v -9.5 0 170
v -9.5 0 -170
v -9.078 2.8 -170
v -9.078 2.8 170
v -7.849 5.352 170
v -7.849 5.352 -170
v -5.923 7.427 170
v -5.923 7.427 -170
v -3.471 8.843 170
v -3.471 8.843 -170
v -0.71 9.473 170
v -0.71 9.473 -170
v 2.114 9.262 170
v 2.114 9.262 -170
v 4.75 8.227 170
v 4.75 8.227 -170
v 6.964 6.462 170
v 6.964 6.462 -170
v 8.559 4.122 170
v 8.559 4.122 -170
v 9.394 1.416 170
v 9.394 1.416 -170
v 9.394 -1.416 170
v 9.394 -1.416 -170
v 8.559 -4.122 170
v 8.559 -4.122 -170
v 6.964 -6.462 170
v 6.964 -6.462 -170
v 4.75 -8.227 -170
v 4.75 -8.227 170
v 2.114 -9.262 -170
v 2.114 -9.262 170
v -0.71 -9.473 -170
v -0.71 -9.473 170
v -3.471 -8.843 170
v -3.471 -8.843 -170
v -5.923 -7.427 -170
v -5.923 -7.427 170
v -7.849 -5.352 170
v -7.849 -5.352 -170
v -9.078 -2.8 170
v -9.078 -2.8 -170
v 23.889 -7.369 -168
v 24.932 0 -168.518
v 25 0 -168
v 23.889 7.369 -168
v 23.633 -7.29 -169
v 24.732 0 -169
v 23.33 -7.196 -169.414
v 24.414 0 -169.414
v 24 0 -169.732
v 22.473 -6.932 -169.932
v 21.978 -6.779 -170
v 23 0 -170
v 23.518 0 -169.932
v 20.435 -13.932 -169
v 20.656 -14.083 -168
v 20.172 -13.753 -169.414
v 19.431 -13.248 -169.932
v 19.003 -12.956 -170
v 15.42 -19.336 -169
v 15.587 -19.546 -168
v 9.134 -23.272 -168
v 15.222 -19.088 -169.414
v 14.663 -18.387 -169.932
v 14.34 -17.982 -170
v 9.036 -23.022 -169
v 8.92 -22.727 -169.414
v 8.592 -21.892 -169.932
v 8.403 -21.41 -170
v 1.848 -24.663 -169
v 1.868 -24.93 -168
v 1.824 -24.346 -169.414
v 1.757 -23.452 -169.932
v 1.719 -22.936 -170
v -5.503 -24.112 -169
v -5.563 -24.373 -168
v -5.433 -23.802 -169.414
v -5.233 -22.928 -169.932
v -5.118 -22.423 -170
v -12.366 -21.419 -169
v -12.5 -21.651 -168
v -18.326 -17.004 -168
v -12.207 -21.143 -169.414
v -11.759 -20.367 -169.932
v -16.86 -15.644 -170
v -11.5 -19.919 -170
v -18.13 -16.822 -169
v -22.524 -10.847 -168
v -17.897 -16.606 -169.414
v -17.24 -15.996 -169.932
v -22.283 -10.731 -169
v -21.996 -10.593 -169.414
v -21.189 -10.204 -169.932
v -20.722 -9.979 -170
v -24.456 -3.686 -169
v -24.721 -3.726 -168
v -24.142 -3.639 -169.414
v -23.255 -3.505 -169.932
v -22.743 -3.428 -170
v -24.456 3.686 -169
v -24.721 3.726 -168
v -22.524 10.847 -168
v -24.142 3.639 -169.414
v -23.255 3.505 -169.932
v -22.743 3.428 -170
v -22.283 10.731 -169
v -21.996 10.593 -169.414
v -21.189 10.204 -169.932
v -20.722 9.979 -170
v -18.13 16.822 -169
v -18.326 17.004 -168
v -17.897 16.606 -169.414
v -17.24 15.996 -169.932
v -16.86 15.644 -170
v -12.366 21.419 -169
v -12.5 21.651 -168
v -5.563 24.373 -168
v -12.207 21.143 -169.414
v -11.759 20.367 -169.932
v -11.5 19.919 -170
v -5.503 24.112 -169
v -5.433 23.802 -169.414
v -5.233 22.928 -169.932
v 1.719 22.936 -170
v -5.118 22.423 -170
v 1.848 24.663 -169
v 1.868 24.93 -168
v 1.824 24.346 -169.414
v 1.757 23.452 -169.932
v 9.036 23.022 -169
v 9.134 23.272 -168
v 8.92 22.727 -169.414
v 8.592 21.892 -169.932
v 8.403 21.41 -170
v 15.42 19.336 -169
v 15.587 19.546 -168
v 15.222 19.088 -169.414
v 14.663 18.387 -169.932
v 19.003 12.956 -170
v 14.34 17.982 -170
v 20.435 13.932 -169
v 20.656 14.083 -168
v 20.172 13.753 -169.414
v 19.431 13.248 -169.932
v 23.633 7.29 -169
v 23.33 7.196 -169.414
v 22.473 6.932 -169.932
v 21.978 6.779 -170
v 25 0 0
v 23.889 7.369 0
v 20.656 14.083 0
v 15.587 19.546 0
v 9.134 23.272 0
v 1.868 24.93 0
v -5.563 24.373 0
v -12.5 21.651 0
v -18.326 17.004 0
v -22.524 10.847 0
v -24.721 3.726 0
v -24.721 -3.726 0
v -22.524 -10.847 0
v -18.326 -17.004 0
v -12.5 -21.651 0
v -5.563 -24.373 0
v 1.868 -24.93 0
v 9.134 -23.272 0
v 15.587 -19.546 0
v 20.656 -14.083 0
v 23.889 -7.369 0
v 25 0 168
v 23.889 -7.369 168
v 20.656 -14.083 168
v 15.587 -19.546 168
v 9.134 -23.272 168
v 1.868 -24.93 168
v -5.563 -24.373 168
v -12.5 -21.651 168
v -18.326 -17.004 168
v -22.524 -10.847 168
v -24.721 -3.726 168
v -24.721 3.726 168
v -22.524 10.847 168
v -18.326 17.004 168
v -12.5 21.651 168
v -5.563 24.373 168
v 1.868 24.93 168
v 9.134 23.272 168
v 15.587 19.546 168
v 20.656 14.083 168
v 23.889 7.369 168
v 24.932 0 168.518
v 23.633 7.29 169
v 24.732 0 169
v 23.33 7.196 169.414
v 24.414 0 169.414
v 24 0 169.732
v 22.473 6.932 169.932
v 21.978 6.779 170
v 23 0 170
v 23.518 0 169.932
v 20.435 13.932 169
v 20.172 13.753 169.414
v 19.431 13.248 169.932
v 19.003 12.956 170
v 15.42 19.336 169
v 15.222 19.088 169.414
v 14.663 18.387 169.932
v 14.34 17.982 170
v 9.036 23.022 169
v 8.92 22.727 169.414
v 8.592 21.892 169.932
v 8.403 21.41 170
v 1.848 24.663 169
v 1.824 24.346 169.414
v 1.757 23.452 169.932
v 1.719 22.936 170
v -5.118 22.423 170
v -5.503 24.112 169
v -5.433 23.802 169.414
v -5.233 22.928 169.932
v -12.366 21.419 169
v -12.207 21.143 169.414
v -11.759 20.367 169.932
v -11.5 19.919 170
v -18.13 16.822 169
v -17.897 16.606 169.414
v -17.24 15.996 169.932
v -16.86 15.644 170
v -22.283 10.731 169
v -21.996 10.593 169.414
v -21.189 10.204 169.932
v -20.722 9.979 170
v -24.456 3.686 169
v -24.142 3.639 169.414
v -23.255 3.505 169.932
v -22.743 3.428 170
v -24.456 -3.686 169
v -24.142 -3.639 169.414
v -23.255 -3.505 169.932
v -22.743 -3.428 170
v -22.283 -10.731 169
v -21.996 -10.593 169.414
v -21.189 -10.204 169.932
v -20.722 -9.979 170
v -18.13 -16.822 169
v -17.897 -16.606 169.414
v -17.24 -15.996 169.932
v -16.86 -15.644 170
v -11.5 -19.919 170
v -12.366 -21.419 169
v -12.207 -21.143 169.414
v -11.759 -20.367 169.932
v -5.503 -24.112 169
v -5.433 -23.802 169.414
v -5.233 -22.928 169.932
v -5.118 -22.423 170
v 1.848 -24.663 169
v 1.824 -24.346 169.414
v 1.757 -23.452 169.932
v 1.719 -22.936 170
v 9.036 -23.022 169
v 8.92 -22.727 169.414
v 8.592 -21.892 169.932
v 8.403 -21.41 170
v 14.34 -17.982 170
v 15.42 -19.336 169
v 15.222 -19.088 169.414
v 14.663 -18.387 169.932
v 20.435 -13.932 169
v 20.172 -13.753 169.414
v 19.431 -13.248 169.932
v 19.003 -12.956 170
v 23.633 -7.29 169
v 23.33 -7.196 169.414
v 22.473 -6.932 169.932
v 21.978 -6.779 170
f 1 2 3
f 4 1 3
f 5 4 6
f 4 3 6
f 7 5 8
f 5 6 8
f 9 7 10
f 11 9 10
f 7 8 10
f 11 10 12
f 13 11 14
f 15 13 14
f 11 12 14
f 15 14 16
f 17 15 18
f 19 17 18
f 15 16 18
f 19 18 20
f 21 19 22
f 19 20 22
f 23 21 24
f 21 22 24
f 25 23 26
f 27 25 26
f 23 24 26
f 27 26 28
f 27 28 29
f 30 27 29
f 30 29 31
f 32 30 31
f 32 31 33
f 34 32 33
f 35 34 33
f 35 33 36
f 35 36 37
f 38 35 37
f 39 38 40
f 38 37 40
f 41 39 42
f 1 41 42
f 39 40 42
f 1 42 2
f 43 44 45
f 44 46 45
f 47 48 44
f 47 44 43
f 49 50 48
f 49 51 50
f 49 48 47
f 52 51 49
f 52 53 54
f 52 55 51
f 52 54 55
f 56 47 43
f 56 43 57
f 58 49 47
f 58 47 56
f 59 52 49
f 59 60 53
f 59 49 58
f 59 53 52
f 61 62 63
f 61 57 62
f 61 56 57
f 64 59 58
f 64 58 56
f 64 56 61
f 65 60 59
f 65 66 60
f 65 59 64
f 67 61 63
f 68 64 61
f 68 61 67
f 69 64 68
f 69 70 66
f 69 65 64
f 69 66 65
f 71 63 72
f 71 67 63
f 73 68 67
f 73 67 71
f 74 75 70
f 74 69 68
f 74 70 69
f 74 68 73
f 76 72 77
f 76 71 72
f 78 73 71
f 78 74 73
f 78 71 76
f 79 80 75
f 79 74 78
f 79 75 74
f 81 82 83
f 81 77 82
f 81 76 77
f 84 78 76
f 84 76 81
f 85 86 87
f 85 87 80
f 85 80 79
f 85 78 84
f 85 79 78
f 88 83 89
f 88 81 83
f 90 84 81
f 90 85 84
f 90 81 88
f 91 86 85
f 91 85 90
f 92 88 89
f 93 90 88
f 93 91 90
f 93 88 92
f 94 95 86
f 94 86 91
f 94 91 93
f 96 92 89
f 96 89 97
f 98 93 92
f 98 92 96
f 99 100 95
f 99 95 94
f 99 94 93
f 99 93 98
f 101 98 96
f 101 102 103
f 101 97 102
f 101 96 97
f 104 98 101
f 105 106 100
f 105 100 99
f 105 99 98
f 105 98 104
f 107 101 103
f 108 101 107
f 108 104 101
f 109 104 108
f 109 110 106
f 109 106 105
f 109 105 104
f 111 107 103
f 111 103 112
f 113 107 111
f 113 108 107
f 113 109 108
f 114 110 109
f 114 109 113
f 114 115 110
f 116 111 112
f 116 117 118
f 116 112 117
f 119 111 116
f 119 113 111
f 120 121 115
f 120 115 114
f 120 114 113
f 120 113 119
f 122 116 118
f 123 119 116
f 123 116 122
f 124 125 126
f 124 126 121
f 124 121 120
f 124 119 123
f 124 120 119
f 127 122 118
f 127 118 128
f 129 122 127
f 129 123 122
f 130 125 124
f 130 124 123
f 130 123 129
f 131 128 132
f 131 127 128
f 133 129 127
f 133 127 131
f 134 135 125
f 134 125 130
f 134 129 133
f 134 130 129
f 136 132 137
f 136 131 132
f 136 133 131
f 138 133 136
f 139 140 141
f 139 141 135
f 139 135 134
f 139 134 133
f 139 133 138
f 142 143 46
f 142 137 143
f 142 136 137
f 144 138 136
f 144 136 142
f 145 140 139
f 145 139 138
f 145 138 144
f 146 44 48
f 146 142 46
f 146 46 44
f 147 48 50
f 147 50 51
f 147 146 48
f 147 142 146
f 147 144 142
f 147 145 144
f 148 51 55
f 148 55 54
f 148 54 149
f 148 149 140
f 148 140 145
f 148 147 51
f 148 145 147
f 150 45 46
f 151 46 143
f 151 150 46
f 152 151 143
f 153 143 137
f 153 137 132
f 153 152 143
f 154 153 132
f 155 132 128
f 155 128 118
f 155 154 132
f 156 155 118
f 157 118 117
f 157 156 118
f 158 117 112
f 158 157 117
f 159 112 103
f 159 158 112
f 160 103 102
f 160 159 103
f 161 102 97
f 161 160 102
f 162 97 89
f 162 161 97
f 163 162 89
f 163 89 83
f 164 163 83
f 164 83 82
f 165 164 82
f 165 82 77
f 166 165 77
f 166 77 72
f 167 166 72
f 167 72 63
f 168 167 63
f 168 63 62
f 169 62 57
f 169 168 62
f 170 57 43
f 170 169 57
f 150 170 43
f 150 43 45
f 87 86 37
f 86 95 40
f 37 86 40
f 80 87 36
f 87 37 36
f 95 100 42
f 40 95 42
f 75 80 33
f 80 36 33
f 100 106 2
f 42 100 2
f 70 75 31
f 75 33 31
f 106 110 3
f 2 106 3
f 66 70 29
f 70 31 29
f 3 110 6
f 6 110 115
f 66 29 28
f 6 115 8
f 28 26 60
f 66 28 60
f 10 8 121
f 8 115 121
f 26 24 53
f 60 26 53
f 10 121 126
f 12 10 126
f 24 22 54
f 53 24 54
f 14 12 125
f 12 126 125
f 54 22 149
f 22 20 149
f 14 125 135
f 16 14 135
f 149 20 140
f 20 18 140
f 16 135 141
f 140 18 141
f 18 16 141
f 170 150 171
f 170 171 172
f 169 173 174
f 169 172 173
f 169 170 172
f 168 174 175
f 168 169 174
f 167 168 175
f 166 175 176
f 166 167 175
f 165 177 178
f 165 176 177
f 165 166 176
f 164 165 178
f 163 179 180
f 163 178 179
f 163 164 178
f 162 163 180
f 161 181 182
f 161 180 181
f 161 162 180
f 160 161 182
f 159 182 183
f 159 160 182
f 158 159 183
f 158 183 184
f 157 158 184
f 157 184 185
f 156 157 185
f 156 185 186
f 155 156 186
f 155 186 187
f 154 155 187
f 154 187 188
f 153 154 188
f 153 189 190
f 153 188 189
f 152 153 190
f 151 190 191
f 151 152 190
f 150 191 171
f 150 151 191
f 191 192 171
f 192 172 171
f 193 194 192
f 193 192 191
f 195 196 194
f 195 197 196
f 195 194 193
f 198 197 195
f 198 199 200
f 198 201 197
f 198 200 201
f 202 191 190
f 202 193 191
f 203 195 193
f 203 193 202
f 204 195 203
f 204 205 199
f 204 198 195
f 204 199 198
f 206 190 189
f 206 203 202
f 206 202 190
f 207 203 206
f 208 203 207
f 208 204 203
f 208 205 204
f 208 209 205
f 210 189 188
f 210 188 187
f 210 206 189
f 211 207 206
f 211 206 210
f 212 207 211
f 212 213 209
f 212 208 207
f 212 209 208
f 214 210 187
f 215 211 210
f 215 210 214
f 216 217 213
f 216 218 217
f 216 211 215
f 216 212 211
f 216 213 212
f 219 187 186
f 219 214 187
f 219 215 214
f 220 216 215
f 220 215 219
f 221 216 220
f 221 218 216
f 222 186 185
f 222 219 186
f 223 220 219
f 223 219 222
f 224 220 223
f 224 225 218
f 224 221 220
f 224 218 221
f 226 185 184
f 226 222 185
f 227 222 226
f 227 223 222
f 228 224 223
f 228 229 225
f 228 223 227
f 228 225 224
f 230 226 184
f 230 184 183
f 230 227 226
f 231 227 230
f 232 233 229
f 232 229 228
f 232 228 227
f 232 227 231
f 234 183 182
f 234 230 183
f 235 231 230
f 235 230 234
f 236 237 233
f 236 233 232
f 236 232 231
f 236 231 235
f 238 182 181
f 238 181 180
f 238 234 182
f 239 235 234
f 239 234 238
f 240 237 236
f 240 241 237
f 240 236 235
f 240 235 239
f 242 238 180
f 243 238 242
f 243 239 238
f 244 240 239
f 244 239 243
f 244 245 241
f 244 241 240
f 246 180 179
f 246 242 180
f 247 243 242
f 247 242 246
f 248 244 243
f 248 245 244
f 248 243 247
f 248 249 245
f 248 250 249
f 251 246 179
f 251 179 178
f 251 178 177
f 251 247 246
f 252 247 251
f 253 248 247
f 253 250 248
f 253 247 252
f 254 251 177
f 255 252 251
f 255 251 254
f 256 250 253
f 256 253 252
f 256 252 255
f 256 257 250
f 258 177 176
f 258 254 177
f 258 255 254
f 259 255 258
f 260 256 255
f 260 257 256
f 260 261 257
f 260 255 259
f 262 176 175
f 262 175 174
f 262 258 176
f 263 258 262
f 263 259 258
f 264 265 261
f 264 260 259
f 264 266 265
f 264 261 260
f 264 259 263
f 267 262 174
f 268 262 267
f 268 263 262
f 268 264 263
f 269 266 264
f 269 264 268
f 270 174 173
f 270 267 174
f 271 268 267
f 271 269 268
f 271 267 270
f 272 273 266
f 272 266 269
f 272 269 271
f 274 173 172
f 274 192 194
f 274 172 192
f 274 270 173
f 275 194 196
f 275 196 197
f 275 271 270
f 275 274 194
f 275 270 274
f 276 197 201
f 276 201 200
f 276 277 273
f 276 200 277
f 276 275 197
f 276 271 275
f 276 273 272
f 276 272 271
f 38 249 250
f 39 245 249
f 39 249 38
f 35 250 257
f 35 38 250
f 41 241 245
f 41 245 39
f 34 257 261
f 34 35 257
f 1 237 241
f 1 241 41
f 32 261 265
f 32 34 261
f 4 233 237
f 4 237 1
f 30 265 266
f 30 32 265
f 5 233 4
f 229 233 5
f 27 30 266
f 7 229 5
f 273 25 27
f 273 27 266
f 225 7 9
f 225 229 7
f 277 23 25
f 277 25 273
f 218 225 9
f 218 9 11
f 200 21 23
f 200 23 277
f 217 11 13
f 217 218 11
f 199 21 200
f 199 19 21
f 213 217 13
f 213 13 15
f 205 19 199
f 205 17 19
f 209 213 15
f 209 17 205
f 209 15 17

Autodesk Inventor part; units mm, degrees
ref_plane "YZ Plane" through (0, 0, 0) normal (1, 0, 0) x (0, 1, 0)
ref_plane "XZ Plane" through (0, 0, 0) normal (0, 1, 0) x (-1, 0, 0)
ref_plane "XY Plane" through (0, 0, 0) normal (0, 0, 1) x (1, 0, 0)
sketch "Sketch1" plane through (0, 0, 0) normal (0, 0, 1) x (1, 0, 0)
  circle A0 centre (0, 0) radius 25
  dimension "d0" = 50
extrude "Extrusion1" add sketch "Sketch1" along normal mid plane 340
sketch "Sketch2" plane through (0, 0, -170) normal (0, 0, -1) x (-1, 0, 0)
  circle A0 centre (0, 0) radius 25 projected
  circle A1 centre (0, 0) radius 9.5
  dimension "d3" = 19
extrude "Extrusion2" cut sketch "Sketch2" against normal blind 555 contours A1
fillet "Fillet1" radius 2 2 edges at (-25, 0, -170) (-25, 0, 170)
properties part number "ADSK-MH-10049" material "Rubber"
